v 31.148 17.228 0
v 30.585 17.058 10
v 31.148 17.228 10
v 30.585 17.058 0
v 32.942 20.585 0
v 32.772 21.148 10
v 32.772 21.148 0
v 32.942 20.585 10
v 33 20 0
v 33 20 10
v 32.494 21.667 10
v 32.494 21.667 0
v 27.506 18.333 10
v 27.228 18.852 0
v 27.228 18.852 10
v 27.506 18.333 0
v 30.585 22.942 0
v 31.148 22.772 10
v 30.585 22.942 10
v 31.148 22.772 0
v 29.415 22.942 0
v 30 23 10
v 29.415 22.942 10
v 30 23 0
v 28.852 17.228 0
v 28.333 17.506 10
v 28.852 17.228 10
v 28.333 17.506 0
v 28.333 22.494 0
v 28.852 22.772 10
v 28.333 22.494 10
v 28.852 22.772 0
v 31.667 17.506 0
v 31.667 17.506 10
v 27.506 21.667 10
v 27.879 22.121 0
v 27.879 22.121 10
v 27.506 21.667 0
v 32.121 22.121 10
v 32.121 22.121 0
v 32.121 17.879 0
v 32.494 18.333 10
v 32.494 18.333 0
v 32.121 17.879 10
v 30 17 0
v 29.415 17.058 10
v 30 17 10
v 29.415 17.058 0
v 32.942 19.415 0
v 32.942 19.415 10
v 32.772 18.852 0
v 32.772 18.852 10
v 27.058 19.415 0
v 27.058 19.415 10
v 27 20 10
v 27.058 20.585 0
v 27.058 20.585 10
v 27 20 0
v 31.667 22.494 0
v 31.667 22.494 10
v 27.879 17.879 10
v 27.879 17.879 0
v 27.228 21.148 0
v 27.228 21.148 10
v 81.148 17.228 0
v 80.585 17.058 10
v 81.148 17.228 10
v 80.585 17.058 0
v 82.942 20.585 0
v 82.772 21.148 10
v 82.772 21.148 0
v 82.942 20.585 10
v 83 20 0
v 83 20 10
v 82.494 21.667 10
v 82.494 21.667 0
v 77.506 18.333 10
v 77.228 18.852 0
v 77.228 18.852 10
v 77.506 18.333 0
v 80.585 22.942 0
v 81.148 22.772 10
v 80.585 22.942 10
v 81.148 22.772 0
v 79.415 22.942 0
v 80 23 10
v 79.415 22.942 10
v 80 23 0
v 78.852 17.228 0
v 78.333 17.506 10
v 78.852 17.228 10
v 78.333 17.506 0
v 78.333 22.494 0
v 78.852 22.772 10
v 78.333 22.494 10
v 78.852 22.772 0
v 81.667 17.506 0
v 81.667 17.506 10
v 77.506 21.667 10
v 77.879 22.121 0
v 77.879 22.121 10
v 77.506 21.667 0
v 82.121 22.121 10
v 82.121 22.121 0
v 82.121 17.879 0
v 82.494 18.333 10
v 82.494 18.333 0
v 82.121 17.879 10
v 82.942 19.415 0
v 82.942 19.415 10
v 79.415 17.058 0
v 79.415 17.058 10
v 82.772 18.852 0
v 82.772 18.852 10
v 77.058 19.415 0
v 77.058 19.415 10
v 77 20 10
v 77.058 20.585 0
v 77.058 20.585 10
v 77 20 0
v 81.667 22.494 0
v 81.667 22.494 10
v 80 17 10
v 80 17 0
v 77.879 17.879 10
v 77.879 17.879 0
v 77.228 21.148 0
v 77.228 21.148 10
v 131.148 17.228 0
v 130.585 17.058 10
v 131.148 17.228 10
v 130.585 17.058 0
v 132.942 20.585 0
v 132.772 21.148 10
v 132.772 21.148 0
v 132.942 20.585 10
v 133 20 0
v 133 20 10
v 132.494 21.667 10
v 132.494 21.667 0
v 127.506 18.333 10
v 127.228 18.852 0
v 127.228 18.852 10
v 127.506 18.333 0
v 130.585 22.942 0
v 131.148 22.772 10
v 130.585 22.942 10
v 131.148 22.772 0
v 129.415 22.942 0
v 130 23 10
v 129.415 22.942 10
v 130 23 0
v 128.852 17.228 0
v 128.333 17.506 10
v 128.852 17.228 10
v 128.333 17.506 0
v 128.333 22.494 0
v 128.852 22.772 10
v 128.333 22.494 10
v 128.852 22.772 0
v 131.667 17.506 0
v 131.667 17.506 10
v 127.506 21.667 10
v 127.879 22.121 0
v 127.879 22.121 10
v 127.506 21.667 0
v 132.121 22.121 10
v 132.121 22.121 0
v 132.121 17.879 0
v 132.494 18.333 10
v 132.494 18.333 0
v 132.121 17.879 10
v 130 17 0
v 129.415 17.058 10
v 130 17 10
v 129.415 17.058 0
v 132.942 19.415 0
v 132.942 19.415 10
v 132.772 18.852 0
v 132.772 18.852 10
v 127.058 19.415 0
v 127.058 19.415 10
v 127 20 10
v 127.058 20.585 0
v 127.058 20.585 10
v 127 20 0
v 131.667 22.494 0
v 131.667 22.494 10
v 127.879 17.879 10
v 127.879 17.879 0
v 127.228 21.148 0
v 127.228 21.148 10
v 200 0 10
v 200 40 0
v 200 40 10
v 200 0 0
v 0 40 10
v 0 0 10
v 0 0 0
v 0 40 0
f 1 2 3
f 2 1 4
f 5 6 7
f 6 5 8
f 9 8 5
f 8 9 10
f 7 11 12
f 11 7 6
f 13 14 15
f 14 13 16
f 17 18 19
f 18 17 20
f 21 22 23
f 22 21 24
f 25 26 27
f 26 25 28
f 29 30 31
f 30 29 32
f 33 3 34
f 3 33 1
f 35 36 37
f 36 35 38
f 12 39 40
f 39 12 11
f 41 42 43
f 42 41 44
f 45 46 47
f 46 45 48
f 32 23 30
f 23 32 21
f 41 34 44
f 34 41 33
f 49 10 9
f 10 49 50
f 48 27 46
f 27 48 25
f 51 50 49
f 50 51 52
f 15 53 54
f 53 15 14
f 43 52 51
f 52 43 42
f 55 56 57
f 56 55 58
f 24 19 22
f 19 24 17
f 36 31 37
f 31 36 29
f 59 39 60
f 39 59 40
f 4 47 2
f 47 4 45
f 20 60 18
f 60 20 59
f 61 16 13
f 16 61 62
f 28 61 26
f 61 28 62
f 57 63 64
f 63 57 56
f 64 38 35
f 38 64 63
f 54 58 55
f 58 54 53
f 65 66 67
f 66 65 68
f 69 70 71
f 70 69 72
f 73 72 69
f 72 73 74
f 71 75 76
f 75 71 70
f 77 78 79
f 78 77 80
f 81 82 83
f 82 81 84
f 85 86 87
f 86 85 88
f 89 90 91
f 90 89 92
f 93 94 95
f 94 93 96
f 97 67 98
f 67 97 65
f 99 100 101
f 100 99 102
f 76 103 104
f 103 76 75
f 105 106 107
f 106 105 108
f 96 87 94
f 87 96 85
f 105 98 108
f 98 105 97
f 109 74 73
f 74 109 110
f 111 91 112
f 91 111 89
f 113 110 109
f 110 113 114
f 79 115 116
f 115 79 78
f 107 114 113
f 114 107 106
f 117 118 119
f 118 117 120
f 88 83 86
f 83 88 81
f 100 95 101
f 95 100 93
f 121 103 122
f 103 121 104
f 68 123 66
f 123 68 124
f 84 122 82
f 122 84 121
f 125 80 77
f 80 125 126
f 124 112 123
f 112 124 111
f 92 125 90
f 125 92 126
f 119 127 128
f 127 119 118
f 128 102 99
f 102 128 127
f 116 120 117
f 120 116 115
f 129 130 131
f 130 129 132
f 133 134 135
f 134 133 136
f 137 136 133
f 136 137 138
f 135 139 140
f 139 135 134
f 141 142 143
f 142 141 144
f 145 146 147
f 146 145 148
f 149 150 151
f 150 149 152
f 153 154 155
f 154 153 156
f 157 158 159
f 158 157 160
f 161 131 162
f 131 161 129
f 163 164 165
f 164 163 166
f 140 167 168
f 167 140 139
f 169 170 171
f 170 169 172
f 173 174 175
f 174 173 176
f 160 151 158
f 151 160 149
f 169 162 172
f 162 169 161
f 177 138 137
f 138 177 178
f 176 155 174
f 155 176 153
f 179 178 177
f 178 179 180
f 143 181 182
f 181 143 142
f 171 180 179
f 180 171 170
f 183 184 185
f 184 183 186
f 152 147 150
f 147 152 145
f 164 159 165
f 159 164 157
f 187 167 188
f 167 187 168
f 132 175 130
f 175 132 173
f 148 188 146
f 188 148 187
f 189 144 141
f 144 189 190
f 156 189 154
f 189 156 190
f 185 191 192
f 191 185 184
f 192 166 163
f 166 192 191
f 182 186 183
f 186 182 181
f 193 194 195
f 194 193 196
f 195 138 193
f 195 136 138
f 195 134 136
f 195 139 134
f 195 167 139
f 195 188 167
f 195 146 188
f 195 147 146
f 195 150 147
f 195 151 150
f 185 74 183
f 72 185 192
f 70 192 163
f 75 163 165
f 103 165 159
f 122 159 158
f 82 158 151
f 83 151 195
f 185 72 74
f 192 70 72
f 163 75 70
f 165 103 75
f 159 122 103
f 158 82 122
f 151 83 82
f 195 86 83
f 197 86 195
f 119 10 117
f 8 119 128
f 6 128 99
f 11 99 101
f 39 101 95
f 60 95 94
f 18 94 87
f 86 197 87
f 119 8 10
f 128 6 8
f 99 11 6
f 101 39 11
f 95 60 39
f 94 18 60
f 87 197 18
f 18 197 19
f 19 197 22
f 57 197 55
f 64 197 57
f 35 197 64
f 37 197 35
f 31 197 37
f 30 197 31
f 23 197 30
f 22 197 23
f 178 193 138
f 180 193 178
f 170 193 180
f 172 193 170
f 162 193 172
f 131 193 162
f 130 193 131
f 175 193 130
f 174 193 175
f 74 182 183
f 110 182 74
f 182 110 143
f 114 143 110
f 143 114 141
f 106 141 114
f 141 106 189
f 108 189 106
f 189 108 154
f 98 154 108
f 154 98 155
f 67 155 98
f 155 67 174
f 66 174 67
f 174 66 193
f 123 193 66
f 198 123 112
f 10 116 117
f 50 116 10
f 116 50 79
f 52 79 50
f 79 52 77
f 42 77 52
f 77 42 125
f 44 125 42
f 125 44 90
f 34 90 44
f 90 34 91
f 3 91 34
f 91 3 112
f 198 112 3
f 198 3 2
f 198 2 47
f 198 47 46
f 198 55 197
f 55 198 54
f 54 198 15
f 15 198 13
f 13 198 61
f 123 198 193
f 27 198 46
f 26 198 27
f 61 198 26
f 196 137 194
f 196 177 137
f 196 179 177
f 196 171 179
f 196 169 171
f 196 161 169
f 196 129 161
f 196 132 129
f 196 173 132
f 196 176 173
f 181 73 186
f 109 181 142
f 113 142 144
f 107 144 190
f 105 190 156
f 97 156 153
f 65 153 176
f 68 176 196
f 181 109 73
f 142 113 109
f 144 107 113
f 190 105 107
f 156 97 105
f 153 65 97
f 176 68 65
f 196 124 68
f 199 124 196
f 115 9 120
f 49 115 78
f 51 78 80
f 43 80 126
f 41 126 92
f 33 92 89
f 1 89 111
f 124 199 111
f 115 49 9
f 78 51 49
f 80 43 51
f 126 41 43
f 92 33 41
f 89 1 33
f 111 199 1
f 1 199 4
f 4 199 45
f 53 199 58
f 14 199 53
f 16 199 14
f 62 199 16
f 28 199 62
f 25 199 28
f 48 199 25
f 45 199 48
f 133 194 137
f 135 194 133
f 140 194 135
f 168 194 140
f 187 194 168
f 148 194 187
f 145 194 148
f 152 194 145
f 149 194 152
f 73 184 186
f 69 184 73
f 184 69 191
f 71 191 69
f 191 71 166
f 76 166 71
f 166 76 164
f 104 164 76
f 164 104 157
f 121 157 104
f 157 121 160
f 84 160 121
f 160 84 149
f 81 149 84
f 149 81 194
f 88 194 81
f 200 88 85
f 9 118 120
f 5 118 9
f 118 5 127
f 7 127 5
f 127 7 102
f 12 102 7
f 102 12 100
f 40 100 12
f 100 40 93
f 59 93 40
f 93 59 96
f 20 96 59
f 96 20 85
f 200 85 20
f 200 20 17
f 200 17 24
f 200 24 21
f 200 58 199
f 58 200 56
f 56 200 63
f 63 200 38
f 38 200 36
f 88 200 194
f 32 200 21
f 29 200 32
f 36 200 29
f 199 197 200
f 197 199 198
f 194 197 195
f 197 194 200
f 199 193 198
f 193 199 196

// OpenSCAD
$fn = 32;

// ----------------------------------------------------------------------
// Long rail: 200-250 mm mounting rail
// ----------------------------------------------------------------------

// --- parameters (mm) ---
rail_l = 200;             // rail length, X
rail_w = 40;              // rail width, Y
rail_t = 10;              // rail thickness, Z
hole_d = 6;               // mounting hole diameter
hole_start = 30;          // first hole offset from the end
hole_pitch = 50;          // hole pitch
holes = 3;                // number of holes

difference() {
  cube([rail_l, rail_w, rail_t]);
  for (i = [0 : holes - 1])
    translate([hole_start + i * hole_pitch, rail_w / 2, -1])
      cylinder(h = rail_t + 2, d = hole_d);
}
